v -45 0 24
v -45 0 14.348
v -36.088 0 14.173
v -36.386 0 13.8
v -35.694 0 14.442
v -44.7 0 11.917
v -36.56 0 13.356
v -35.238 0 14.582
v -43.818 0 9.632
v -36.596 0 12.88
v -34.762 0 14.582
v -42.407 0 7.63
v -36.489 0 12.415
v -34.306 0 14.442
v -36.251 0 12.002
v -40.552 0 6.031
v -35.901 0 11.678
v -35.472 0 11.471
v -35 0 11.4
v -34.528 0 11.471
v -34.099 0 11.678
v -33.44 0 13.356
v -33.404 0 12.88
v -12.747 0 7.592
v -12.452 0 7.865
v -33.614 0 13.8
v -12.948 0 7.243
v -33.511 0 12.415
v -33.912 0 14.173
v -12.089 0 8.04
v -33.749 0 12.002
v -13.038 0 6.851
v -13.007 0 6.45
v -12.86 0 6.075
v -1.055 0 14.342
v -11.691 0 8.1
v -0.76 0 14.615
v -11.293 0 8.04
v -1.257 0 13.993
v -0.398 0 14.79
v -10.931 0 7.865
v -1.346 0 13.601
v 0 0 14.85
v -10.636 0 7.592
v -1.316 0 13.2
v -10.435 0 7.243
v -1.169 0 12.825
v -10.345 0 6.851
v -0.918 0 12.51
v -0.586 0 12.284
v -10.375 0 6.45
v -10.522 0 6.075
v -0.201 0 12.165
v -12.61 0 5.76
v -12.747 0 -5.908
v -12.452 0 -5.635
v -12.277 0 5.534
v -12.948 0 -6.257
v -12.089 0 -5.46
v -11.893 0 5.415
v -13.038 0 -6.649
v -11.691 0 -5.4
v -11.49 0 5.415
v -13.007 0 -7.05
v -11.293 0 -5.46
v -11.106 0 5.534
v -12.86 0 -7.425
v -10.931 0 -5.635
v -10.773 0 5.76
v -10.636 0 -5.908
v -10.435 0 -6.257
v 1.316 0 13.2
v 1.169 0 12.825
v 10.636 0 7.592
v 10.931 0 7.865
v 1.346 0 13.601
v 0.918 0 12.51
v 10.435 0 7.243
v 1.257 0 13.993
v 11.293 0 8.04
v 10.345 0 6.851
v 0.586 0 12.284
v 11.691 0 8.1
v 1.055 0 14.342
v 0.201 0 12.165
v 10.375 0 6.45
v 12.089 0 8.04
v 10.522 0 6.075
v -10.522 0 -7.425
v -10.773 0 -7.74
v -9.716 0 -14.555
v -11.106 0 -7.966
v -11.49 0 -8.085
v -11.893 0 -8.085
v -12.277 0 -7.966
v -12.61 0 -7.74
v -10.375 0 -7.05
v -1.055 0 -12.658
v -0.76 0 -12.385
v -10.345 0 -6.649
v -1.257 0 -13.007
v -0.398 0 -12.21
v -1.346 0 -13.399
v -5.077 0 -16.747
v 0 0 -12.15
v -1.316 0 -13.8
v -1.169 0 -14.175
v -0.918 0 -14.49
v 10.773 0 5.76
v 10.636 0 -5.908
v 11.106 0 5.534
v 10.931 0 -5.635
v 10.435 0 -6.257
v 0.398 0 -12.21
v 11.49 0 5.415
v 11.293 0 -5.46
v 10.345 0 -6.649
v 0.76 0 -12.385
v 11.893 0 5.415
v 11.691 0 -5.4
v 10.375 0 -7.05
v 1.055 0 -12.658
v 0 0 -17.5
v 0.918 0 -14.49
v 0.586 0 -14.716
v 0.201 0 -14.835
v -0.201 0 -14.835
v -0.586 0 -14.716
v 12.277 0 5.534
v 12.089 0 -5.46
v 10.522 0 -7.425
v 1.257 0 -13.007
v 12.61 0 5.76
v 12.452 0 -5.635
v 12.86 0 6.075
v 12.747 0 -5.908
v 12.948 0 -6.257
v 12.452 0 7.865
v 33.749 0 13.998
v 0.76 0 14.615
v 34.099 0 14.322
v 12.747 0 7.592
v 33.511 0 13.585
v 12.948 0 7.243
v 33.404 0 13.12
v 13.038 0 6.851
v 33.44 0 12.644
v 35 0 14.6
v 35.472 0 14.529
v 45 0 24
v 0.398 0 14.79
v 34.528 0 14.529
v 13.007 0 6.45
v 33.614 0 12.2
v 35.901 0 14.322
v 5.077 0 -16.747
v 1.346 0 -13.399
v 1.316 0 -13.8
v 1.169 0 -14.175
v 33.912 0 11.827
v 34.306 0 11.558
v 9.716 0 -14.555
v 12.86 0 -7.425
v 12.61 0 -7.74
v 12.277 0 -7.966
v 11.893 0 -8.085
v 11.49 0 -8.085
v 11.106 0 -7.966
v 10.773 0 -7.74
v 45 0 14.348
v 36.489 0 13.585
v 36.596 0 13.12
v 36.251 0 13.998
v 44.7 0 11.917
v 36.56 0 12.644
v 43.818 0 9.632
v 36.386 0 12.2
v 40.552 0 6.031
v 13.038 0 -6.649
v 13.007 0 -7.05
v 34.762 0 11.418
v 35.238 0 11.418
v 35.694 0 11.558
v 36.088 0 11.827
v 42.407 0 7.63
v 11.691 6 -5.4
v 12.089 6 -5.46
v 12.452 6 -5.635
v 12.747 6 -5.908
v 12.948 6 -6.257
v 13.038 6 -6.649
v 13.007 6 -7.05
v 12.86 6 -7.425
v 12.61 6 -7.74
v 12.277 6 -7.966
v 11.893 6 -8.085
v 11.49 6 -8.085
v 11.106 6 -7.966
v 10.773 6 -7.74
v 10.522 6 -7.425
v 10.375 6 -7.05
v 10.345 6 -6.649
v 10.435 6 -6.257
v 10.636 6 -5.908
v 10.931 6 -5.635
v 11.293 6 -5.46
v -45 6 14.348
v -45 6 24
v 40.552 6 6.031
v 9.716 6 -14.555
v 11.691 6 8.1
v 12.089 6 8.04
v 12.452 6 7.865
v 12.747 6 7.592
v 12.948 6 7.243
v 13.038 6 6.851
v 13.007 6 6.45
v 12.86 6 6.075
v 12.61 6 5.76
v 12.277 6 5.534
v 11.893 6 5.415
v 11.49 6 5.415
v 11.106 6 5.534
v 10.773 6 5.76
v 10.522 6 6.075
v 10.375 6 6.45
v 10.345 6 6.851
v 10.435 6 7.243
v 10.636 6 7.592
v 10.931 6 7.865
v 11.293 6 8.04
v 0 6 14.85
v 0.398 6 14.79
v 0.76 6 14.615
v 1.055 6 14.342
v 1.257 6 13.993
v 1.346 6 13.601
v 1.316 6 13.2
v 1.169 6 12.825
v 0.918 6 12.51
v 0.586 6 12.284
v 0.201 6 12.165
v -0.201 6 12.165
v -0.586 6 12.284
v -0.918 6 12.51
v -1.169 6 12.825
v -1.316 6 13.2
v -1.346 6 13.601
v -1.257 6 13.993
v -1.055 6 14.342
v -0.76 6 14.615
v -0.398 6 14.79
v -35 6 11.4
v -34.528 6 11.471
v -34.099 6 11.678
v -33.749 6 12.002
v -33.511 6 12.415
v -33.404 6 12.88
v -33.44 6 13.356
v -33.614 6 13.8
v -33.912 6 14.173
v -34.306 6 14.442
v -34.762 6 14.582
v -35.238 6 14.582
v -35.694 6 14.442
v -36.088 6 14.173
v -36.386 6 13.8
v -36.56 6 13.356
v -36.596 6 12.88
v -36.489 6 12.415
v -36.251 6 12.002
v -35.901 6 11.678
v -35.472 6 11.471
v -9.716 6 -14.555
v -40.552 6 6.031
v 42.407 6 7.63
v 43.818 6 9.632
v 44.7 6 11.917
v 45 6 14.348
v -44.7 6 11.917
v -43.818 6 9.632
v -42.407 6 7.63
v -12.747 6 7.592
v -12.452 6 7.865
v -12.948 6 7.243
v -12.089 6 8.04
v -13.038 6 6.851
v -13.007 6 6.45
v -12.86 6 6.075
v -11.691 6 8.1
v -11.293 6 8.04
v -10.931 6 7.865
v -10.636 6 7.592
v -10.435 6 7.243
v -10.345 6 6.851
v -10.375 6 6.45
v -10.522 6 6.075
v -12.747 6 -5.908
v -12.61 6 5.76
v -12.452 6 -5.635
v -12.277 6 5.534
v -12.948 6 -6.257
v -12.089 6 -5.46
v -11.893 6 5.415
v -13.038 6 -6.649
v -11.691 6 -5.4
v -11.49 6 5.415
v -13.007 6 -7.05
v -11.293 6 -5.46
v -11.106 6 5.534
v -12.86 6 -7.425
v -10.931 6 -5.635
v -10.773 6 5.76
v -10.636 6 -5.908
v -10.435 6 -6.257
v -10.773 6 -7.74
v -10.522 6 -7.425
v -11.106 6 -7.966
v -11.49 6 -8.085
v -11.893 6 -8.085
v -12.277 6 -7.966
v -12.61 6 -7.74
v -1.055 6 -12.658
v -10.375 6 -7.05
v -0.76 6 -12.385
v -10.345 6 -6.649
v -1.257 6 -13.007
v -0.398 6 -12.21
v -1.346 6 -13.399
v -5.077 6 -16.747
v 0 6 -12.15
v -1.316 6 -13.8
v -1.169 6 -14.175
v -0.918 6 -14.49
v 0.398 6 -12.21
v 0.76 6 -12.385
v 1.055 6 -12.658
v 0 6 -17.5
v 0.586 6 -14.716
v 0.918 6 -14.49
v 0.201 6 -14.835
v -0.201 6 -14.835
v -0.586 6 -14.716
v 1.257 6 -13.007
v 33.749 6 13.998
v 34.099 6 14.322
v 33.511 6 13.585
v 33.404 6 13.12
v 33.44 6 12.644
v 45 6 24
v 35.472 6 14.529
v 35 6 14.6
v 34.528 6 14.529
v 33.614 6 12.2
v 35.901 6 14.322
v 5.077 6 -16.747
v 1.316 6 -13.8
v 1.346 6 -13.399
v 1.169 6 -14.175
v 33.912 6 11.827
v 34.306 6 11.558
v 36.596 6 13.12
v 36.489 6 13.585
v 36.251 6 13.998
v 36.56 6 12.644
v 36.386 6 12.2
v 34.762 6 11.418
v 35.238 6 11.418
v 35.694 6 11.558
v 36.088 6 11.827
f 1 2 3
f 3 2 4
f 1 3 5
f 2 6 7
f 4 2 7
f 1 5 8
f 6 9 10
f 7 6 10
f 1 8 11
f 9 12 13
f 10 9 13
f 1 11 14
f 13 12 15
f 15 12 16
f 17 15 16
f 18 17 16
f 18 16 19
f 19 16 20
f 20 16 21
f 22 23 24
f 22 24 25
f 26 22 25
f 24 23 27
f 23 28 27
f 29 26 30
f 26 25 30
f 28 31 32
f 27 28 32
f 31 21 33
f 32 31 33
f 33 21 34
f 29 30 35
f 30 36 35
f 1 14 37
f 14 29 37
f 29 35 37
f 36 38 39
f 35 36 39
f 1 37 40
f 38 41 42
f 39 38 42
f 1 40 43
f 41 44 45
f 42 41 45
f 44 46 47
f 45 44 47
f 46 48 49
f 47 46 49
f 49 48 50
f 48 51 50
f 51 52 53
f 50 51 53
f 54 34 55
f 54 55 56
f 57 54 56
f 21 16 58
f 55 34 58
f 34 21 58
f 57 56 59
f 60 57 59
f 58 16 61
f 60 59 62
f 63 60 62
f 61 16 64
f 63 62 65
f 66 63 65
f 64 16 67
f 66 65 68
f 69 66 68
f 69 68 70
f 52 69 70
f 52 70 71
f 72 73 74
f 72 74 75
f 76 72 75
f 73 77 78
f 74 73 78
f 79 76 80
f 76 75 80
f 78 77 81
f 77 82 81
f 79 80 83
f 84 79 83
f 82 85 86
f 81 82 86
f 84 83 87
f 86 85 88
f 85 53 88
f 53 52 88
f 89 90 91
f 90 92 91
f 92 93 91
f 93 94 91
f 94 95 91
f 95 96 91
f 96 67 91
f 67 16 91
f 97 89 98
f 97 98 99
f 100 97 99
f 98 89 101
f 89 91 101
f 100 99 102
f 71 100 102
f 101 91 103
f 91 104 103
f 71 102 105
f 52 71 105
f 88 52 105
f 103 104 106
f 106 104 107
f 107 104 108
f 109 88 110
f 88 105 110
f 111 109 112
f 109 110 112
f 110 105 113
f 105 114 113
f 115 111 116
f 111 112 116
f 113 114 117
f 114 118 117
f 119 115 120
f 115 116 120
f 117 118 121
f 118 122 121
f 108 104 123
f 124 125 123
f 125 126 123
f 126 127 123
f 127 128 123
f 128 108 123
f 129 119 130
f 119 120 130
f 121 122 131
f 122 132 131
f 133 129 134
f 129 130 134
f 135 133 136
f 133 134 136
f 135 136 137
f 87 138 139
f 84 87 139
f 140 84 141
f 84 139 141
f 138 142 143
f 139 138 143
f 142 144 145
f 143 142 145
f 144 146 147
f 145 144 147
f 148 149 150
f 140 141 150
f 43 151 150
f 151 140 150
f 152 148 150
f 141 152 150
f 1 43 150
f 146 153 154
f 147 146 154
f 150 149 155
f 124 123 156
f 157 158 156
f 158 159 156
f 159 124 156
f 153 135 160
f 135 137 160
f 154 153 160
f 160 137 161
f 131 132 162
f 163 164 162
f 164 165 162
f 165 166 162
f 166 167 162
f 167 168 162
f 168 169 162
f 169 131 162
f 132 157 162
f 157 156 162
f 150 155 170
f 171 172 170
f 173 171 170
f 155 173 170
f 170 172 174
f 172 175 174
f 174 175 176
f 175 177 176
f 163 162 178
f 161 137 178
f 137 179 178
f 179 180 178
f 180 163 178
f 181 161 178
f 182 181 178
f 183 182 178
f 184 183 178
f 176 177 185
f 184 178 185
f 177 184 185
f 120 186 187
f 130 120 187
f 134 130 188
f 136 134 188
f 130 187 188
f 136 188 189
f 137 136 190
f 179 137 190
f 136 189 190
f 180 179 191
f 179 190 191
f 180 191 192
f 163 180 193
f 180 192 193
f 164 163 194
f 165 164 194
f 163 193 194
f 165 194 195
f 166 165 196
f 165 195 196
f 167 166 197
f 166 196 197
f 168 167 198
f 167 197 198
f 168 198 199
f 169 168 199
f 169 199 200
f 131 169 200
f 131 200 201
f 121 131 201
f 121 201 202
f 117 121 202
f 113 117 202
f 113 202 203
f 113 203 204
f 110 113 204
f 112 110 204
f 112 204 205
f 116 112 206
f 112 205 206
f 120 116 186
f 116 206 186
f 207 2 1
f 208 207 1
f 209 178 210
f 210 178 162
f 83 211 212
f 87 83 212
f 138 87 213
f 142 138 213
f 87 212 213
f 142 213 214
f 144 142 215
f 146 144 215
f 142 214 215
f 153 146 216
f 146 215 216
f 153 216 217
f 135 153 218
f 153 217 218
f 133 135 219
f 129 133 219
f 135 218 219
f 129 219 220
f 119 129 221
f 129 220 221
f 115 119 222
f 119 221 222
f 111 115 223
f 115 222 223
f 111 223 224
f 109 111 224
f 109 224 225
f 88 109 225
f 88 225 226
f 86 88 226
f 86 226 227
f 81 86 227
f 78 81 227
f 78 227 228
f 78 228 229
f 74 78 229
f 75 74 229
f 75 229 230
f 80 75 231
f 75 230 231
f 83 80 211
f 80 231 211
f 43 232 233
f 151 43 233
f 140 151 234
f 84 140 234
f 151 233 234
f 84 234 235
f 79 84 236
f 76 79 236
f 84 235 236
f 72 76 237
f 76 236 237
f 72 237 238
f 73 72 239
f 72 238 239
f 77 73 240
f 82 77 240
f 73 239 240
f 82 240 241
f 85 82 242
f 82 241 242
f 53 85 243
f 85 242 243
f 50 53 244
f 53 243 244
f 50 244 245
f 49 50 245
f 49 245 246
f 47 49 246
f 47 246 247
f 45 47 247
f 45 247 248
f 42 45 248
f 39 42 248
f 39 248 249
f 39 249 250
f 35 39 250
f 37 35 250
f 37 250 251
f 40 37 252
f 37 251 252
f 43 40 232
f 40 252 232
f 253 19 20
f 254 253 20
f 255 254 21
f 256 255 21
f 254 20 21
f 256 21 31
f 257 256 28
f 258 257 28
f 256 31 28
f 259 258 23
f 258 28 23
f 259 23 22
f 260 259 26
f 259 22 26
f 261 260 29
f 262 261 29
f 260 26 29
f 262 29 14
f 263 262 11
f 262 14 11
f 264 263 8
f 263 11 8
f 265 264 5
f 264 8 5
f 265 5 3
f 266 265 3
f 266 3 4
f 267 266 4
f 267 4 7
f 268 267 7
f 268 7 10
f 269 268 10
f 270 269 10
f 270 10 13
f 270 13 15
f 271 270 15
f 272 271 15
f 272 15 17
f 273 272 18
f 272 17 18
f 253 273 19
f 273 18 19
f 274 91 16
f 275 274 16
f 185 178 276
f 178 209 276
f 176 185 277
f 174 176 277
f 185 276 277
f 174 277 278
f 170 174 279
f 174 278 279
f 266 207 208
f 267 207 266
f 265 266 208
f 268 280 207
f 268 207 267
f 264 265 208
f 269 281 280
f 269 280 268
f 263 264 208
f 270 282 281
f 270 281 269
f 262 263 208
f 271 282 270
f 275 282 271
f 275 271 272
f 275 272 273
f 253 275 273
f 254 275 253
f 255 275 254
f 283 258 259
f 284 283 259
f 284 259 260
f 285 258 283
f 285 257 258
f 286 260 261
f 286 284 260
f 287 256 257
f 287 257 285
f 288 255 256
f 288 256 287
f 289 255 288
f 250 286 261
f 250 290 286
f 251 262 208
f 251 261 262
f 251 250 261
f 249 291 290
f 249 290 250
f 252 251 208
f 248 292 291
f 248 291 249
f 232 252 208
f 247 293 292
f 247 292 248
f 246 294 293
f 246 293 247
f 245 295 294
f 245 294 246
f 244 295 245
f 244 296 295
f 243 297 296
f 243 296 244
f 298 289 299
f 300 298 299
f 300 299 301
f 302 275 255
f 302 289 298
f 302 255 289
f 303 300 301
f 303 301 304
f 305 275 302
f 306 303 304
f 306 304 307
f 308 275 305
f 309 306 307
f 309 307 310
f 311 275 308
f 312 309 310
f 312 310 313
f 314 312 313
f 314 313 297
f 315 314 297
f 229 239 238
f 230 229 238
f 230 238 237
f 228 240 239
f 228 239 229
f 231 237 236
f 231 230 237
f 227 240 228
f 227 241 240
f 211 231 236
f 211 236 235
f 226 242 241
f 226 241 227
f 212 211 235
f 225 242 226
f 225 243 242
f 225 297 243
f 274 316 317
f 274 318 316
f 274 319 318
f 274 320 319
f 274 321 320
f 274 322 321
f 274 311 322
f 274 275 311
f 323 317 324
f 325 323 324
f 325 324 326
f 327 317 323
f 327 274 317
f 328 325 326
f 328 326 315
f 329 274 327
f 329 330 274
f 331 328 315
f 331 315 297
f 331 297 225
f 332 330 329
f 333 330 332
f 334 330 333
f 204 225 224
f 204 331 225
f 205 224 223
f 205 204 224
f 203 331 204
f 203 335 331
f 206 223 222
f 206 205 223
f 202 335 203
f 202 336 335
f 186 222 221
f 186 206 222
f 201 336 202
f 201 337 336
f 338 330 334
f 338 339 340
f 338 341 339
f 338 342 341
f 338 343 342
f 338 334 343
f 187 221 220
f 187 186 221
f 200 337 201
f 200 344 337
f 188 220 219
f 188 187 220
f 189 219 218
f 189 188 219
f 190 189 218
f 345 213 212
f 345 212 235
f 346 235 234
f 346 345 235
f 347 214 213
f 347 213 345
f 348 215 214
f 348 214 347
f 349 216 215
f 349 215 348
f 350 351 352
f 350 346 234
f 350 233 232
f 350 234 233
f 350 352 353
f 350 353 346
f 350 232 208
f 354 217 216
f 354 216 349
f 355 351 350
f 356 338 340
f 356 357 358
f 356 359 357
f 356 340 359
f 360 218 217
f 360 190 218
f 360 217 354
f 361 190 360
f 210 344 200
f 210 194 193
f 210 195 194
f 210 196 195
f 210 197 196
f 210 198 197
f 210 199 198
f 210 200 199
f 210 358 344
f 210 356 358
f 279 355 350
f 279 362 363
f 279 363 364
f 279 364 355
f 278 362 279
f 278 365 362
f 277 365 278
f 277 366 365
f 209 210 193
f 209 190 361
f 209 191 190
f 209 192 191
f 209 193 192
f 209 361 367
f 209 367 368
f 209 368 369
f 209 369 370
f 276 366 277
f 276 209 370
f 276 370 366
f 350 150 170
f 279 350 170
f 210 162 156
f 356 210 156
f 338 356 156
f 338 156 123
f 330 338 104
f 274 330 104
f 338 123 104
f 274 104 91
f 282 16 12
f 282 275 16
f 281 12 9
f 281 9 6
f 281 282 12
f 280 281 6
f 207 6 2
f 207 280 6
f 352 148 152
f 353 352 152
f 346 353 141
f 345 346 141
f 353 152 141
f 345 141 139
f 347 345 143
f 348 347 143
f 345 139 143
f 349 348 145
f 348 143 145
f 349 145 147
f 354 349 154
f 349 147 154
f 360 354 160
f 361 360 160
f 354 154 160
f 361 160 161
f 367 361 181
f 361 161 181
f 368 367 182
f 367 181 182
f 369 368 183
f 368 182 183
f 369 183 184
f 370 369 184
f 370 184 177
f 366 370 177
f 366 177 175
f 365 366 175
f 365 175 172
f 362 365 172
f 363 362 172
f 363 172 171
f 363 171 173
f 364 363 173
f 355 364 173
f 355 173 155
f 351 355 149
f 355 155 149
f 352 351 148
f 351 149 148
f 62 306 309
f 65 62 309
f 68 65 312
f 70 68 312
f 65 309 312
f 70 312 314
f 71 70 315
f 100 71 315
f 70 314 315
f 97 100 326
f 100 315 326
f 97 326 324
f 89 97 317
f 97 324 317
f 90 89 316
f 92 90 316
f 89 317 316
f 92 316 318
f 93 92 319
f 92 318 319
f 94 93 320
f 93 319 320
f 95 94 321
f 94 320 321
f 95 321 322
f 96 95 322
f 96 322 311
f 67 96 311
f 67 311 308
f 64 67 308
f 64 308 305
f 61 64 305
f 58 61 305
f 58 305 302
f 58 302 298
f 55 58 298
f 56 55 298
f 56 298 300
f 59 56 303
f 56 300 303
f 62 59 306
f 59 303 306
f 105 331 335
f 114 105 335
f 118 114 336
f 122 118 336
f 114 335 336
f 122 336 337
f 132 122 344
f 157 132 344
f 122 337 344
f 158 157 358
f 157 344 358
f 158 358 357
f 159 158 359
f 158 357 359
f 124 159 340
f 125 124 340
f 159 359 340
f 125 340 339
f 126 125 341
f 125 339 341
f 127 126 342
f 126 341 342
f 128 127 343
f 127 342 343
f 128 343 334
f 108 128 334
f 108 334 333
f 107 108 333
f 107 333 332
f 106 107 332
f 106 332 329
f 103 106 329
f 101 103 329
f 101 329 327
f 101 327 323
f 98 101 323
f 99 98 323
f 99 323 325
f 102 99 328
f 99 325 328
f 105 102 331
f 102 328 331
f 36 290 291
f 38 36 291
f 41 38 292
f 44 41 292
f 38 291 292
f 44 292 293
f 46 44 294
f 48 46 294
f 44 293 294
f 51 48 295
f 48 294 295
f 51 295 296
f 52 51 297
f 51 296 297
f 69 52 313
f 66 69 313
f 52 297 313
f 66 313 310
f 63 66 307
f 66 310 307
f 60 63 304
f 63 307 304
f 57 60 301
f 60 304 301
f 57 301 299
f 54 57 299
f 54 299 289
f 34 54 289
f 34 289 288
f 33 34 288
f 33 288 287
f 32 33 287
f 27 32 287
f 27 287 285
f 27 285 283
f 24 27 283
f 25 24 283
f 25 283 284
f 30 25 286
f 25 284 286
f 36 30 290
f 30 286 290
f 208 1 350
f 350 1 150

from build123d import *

# Parameters (mm, degrees)
EXTRUDE_1_DEPTH     = 6
SKETCH_2_R          = 1.35
CUT_EXTRUDE_1_DEPTH = 6
FILLET_1_R          = 10
SKETCH_3_R          = 1.6
CUT_EXTRUDE_2_DEPTH = 6


with BuildPart() as part:
    # 草图1 → 凸台-拉伸1 (new body)
    with BuildSketch(Plane(origin=(0, 0, 0), x_dir=(1, 0, 0), z_dir=(0, 1, 0))):
        with BuildLine():
            Line((-9.716498114, 14.55471279), (-45, -9))
            Line((-45, -9), (-45, -24))
            Line((-45, -24), (45, -24))
            Line((45, -24), (45, -9))
            Line((45, -9), (9.716498114, 14.55471279))
            ThreePointArc((9.716498114, 14.55471279), (0, 17.5), (-9.716498114, 14.55471279))
        make_face()
    extrude(amount=EXTRUDE_1_DEPTH)

    # 草图2 → 切除-拉伸1 (cut)
    with BuildSketch(Plane(origin=(0, 6, 0), x_dir=(1, 0, 0), z_dir=(0, 1, 0))):
        with Locations(Location((0, 13.5, 0), (0, 0, 270))):
            Circle(SKETCH_2_R)
        with Locations(Location((11.691342951, 6.75, 0), (0, 0, 270))):
            Circle(SKETCH_2_R)
        with Locations(Location((11.691342951, -6.75, 0), (0, 0, 270))):
            Circle(SKETCH_2_R)
        with Locations(Location((0, -13.5, 0), (0, 0, 270))):
            Circle(SKETCH_2_R)
        with Locations(Location((-11.691342951, -6.75, 0), (0, 0, 270))):
            Circle(SKETCH_2_R)
        with Locations(Location((-11.691342951, 6.75, 0), (0, 0, 270))):
            Circle(SKETCH_2_R)
    extrude(amount=-CUT_EXTRUDE_1_DEPTH, mode=Mode.SUBTRACT)

    # 圆角1
    fillet_1_edges = [part.edges().sort_by_distance(p)[0] for p in [
        (45, 3, 9),
        (-45, 3, 9),
    ]]
    fillet(fillet_1_edges, radius=FILLET_1_R)

    # 草图3 → 切除-拉伸2 (cut)
    with BuildSketch(Plane.XZ):
        with Locations(Location((-35, 13, 0), (0, 0, 270))):
            Circle(SKETCH_3_R)
        with Locations(Location((35, 13, 0), (0, 0, 90))):
            Circle(SKETCH_3_R)
    extrude(amount=-CUT_EXTRUDE_2_DEPTH, mode=Mode.SUBTRACT)


solid = part.part
